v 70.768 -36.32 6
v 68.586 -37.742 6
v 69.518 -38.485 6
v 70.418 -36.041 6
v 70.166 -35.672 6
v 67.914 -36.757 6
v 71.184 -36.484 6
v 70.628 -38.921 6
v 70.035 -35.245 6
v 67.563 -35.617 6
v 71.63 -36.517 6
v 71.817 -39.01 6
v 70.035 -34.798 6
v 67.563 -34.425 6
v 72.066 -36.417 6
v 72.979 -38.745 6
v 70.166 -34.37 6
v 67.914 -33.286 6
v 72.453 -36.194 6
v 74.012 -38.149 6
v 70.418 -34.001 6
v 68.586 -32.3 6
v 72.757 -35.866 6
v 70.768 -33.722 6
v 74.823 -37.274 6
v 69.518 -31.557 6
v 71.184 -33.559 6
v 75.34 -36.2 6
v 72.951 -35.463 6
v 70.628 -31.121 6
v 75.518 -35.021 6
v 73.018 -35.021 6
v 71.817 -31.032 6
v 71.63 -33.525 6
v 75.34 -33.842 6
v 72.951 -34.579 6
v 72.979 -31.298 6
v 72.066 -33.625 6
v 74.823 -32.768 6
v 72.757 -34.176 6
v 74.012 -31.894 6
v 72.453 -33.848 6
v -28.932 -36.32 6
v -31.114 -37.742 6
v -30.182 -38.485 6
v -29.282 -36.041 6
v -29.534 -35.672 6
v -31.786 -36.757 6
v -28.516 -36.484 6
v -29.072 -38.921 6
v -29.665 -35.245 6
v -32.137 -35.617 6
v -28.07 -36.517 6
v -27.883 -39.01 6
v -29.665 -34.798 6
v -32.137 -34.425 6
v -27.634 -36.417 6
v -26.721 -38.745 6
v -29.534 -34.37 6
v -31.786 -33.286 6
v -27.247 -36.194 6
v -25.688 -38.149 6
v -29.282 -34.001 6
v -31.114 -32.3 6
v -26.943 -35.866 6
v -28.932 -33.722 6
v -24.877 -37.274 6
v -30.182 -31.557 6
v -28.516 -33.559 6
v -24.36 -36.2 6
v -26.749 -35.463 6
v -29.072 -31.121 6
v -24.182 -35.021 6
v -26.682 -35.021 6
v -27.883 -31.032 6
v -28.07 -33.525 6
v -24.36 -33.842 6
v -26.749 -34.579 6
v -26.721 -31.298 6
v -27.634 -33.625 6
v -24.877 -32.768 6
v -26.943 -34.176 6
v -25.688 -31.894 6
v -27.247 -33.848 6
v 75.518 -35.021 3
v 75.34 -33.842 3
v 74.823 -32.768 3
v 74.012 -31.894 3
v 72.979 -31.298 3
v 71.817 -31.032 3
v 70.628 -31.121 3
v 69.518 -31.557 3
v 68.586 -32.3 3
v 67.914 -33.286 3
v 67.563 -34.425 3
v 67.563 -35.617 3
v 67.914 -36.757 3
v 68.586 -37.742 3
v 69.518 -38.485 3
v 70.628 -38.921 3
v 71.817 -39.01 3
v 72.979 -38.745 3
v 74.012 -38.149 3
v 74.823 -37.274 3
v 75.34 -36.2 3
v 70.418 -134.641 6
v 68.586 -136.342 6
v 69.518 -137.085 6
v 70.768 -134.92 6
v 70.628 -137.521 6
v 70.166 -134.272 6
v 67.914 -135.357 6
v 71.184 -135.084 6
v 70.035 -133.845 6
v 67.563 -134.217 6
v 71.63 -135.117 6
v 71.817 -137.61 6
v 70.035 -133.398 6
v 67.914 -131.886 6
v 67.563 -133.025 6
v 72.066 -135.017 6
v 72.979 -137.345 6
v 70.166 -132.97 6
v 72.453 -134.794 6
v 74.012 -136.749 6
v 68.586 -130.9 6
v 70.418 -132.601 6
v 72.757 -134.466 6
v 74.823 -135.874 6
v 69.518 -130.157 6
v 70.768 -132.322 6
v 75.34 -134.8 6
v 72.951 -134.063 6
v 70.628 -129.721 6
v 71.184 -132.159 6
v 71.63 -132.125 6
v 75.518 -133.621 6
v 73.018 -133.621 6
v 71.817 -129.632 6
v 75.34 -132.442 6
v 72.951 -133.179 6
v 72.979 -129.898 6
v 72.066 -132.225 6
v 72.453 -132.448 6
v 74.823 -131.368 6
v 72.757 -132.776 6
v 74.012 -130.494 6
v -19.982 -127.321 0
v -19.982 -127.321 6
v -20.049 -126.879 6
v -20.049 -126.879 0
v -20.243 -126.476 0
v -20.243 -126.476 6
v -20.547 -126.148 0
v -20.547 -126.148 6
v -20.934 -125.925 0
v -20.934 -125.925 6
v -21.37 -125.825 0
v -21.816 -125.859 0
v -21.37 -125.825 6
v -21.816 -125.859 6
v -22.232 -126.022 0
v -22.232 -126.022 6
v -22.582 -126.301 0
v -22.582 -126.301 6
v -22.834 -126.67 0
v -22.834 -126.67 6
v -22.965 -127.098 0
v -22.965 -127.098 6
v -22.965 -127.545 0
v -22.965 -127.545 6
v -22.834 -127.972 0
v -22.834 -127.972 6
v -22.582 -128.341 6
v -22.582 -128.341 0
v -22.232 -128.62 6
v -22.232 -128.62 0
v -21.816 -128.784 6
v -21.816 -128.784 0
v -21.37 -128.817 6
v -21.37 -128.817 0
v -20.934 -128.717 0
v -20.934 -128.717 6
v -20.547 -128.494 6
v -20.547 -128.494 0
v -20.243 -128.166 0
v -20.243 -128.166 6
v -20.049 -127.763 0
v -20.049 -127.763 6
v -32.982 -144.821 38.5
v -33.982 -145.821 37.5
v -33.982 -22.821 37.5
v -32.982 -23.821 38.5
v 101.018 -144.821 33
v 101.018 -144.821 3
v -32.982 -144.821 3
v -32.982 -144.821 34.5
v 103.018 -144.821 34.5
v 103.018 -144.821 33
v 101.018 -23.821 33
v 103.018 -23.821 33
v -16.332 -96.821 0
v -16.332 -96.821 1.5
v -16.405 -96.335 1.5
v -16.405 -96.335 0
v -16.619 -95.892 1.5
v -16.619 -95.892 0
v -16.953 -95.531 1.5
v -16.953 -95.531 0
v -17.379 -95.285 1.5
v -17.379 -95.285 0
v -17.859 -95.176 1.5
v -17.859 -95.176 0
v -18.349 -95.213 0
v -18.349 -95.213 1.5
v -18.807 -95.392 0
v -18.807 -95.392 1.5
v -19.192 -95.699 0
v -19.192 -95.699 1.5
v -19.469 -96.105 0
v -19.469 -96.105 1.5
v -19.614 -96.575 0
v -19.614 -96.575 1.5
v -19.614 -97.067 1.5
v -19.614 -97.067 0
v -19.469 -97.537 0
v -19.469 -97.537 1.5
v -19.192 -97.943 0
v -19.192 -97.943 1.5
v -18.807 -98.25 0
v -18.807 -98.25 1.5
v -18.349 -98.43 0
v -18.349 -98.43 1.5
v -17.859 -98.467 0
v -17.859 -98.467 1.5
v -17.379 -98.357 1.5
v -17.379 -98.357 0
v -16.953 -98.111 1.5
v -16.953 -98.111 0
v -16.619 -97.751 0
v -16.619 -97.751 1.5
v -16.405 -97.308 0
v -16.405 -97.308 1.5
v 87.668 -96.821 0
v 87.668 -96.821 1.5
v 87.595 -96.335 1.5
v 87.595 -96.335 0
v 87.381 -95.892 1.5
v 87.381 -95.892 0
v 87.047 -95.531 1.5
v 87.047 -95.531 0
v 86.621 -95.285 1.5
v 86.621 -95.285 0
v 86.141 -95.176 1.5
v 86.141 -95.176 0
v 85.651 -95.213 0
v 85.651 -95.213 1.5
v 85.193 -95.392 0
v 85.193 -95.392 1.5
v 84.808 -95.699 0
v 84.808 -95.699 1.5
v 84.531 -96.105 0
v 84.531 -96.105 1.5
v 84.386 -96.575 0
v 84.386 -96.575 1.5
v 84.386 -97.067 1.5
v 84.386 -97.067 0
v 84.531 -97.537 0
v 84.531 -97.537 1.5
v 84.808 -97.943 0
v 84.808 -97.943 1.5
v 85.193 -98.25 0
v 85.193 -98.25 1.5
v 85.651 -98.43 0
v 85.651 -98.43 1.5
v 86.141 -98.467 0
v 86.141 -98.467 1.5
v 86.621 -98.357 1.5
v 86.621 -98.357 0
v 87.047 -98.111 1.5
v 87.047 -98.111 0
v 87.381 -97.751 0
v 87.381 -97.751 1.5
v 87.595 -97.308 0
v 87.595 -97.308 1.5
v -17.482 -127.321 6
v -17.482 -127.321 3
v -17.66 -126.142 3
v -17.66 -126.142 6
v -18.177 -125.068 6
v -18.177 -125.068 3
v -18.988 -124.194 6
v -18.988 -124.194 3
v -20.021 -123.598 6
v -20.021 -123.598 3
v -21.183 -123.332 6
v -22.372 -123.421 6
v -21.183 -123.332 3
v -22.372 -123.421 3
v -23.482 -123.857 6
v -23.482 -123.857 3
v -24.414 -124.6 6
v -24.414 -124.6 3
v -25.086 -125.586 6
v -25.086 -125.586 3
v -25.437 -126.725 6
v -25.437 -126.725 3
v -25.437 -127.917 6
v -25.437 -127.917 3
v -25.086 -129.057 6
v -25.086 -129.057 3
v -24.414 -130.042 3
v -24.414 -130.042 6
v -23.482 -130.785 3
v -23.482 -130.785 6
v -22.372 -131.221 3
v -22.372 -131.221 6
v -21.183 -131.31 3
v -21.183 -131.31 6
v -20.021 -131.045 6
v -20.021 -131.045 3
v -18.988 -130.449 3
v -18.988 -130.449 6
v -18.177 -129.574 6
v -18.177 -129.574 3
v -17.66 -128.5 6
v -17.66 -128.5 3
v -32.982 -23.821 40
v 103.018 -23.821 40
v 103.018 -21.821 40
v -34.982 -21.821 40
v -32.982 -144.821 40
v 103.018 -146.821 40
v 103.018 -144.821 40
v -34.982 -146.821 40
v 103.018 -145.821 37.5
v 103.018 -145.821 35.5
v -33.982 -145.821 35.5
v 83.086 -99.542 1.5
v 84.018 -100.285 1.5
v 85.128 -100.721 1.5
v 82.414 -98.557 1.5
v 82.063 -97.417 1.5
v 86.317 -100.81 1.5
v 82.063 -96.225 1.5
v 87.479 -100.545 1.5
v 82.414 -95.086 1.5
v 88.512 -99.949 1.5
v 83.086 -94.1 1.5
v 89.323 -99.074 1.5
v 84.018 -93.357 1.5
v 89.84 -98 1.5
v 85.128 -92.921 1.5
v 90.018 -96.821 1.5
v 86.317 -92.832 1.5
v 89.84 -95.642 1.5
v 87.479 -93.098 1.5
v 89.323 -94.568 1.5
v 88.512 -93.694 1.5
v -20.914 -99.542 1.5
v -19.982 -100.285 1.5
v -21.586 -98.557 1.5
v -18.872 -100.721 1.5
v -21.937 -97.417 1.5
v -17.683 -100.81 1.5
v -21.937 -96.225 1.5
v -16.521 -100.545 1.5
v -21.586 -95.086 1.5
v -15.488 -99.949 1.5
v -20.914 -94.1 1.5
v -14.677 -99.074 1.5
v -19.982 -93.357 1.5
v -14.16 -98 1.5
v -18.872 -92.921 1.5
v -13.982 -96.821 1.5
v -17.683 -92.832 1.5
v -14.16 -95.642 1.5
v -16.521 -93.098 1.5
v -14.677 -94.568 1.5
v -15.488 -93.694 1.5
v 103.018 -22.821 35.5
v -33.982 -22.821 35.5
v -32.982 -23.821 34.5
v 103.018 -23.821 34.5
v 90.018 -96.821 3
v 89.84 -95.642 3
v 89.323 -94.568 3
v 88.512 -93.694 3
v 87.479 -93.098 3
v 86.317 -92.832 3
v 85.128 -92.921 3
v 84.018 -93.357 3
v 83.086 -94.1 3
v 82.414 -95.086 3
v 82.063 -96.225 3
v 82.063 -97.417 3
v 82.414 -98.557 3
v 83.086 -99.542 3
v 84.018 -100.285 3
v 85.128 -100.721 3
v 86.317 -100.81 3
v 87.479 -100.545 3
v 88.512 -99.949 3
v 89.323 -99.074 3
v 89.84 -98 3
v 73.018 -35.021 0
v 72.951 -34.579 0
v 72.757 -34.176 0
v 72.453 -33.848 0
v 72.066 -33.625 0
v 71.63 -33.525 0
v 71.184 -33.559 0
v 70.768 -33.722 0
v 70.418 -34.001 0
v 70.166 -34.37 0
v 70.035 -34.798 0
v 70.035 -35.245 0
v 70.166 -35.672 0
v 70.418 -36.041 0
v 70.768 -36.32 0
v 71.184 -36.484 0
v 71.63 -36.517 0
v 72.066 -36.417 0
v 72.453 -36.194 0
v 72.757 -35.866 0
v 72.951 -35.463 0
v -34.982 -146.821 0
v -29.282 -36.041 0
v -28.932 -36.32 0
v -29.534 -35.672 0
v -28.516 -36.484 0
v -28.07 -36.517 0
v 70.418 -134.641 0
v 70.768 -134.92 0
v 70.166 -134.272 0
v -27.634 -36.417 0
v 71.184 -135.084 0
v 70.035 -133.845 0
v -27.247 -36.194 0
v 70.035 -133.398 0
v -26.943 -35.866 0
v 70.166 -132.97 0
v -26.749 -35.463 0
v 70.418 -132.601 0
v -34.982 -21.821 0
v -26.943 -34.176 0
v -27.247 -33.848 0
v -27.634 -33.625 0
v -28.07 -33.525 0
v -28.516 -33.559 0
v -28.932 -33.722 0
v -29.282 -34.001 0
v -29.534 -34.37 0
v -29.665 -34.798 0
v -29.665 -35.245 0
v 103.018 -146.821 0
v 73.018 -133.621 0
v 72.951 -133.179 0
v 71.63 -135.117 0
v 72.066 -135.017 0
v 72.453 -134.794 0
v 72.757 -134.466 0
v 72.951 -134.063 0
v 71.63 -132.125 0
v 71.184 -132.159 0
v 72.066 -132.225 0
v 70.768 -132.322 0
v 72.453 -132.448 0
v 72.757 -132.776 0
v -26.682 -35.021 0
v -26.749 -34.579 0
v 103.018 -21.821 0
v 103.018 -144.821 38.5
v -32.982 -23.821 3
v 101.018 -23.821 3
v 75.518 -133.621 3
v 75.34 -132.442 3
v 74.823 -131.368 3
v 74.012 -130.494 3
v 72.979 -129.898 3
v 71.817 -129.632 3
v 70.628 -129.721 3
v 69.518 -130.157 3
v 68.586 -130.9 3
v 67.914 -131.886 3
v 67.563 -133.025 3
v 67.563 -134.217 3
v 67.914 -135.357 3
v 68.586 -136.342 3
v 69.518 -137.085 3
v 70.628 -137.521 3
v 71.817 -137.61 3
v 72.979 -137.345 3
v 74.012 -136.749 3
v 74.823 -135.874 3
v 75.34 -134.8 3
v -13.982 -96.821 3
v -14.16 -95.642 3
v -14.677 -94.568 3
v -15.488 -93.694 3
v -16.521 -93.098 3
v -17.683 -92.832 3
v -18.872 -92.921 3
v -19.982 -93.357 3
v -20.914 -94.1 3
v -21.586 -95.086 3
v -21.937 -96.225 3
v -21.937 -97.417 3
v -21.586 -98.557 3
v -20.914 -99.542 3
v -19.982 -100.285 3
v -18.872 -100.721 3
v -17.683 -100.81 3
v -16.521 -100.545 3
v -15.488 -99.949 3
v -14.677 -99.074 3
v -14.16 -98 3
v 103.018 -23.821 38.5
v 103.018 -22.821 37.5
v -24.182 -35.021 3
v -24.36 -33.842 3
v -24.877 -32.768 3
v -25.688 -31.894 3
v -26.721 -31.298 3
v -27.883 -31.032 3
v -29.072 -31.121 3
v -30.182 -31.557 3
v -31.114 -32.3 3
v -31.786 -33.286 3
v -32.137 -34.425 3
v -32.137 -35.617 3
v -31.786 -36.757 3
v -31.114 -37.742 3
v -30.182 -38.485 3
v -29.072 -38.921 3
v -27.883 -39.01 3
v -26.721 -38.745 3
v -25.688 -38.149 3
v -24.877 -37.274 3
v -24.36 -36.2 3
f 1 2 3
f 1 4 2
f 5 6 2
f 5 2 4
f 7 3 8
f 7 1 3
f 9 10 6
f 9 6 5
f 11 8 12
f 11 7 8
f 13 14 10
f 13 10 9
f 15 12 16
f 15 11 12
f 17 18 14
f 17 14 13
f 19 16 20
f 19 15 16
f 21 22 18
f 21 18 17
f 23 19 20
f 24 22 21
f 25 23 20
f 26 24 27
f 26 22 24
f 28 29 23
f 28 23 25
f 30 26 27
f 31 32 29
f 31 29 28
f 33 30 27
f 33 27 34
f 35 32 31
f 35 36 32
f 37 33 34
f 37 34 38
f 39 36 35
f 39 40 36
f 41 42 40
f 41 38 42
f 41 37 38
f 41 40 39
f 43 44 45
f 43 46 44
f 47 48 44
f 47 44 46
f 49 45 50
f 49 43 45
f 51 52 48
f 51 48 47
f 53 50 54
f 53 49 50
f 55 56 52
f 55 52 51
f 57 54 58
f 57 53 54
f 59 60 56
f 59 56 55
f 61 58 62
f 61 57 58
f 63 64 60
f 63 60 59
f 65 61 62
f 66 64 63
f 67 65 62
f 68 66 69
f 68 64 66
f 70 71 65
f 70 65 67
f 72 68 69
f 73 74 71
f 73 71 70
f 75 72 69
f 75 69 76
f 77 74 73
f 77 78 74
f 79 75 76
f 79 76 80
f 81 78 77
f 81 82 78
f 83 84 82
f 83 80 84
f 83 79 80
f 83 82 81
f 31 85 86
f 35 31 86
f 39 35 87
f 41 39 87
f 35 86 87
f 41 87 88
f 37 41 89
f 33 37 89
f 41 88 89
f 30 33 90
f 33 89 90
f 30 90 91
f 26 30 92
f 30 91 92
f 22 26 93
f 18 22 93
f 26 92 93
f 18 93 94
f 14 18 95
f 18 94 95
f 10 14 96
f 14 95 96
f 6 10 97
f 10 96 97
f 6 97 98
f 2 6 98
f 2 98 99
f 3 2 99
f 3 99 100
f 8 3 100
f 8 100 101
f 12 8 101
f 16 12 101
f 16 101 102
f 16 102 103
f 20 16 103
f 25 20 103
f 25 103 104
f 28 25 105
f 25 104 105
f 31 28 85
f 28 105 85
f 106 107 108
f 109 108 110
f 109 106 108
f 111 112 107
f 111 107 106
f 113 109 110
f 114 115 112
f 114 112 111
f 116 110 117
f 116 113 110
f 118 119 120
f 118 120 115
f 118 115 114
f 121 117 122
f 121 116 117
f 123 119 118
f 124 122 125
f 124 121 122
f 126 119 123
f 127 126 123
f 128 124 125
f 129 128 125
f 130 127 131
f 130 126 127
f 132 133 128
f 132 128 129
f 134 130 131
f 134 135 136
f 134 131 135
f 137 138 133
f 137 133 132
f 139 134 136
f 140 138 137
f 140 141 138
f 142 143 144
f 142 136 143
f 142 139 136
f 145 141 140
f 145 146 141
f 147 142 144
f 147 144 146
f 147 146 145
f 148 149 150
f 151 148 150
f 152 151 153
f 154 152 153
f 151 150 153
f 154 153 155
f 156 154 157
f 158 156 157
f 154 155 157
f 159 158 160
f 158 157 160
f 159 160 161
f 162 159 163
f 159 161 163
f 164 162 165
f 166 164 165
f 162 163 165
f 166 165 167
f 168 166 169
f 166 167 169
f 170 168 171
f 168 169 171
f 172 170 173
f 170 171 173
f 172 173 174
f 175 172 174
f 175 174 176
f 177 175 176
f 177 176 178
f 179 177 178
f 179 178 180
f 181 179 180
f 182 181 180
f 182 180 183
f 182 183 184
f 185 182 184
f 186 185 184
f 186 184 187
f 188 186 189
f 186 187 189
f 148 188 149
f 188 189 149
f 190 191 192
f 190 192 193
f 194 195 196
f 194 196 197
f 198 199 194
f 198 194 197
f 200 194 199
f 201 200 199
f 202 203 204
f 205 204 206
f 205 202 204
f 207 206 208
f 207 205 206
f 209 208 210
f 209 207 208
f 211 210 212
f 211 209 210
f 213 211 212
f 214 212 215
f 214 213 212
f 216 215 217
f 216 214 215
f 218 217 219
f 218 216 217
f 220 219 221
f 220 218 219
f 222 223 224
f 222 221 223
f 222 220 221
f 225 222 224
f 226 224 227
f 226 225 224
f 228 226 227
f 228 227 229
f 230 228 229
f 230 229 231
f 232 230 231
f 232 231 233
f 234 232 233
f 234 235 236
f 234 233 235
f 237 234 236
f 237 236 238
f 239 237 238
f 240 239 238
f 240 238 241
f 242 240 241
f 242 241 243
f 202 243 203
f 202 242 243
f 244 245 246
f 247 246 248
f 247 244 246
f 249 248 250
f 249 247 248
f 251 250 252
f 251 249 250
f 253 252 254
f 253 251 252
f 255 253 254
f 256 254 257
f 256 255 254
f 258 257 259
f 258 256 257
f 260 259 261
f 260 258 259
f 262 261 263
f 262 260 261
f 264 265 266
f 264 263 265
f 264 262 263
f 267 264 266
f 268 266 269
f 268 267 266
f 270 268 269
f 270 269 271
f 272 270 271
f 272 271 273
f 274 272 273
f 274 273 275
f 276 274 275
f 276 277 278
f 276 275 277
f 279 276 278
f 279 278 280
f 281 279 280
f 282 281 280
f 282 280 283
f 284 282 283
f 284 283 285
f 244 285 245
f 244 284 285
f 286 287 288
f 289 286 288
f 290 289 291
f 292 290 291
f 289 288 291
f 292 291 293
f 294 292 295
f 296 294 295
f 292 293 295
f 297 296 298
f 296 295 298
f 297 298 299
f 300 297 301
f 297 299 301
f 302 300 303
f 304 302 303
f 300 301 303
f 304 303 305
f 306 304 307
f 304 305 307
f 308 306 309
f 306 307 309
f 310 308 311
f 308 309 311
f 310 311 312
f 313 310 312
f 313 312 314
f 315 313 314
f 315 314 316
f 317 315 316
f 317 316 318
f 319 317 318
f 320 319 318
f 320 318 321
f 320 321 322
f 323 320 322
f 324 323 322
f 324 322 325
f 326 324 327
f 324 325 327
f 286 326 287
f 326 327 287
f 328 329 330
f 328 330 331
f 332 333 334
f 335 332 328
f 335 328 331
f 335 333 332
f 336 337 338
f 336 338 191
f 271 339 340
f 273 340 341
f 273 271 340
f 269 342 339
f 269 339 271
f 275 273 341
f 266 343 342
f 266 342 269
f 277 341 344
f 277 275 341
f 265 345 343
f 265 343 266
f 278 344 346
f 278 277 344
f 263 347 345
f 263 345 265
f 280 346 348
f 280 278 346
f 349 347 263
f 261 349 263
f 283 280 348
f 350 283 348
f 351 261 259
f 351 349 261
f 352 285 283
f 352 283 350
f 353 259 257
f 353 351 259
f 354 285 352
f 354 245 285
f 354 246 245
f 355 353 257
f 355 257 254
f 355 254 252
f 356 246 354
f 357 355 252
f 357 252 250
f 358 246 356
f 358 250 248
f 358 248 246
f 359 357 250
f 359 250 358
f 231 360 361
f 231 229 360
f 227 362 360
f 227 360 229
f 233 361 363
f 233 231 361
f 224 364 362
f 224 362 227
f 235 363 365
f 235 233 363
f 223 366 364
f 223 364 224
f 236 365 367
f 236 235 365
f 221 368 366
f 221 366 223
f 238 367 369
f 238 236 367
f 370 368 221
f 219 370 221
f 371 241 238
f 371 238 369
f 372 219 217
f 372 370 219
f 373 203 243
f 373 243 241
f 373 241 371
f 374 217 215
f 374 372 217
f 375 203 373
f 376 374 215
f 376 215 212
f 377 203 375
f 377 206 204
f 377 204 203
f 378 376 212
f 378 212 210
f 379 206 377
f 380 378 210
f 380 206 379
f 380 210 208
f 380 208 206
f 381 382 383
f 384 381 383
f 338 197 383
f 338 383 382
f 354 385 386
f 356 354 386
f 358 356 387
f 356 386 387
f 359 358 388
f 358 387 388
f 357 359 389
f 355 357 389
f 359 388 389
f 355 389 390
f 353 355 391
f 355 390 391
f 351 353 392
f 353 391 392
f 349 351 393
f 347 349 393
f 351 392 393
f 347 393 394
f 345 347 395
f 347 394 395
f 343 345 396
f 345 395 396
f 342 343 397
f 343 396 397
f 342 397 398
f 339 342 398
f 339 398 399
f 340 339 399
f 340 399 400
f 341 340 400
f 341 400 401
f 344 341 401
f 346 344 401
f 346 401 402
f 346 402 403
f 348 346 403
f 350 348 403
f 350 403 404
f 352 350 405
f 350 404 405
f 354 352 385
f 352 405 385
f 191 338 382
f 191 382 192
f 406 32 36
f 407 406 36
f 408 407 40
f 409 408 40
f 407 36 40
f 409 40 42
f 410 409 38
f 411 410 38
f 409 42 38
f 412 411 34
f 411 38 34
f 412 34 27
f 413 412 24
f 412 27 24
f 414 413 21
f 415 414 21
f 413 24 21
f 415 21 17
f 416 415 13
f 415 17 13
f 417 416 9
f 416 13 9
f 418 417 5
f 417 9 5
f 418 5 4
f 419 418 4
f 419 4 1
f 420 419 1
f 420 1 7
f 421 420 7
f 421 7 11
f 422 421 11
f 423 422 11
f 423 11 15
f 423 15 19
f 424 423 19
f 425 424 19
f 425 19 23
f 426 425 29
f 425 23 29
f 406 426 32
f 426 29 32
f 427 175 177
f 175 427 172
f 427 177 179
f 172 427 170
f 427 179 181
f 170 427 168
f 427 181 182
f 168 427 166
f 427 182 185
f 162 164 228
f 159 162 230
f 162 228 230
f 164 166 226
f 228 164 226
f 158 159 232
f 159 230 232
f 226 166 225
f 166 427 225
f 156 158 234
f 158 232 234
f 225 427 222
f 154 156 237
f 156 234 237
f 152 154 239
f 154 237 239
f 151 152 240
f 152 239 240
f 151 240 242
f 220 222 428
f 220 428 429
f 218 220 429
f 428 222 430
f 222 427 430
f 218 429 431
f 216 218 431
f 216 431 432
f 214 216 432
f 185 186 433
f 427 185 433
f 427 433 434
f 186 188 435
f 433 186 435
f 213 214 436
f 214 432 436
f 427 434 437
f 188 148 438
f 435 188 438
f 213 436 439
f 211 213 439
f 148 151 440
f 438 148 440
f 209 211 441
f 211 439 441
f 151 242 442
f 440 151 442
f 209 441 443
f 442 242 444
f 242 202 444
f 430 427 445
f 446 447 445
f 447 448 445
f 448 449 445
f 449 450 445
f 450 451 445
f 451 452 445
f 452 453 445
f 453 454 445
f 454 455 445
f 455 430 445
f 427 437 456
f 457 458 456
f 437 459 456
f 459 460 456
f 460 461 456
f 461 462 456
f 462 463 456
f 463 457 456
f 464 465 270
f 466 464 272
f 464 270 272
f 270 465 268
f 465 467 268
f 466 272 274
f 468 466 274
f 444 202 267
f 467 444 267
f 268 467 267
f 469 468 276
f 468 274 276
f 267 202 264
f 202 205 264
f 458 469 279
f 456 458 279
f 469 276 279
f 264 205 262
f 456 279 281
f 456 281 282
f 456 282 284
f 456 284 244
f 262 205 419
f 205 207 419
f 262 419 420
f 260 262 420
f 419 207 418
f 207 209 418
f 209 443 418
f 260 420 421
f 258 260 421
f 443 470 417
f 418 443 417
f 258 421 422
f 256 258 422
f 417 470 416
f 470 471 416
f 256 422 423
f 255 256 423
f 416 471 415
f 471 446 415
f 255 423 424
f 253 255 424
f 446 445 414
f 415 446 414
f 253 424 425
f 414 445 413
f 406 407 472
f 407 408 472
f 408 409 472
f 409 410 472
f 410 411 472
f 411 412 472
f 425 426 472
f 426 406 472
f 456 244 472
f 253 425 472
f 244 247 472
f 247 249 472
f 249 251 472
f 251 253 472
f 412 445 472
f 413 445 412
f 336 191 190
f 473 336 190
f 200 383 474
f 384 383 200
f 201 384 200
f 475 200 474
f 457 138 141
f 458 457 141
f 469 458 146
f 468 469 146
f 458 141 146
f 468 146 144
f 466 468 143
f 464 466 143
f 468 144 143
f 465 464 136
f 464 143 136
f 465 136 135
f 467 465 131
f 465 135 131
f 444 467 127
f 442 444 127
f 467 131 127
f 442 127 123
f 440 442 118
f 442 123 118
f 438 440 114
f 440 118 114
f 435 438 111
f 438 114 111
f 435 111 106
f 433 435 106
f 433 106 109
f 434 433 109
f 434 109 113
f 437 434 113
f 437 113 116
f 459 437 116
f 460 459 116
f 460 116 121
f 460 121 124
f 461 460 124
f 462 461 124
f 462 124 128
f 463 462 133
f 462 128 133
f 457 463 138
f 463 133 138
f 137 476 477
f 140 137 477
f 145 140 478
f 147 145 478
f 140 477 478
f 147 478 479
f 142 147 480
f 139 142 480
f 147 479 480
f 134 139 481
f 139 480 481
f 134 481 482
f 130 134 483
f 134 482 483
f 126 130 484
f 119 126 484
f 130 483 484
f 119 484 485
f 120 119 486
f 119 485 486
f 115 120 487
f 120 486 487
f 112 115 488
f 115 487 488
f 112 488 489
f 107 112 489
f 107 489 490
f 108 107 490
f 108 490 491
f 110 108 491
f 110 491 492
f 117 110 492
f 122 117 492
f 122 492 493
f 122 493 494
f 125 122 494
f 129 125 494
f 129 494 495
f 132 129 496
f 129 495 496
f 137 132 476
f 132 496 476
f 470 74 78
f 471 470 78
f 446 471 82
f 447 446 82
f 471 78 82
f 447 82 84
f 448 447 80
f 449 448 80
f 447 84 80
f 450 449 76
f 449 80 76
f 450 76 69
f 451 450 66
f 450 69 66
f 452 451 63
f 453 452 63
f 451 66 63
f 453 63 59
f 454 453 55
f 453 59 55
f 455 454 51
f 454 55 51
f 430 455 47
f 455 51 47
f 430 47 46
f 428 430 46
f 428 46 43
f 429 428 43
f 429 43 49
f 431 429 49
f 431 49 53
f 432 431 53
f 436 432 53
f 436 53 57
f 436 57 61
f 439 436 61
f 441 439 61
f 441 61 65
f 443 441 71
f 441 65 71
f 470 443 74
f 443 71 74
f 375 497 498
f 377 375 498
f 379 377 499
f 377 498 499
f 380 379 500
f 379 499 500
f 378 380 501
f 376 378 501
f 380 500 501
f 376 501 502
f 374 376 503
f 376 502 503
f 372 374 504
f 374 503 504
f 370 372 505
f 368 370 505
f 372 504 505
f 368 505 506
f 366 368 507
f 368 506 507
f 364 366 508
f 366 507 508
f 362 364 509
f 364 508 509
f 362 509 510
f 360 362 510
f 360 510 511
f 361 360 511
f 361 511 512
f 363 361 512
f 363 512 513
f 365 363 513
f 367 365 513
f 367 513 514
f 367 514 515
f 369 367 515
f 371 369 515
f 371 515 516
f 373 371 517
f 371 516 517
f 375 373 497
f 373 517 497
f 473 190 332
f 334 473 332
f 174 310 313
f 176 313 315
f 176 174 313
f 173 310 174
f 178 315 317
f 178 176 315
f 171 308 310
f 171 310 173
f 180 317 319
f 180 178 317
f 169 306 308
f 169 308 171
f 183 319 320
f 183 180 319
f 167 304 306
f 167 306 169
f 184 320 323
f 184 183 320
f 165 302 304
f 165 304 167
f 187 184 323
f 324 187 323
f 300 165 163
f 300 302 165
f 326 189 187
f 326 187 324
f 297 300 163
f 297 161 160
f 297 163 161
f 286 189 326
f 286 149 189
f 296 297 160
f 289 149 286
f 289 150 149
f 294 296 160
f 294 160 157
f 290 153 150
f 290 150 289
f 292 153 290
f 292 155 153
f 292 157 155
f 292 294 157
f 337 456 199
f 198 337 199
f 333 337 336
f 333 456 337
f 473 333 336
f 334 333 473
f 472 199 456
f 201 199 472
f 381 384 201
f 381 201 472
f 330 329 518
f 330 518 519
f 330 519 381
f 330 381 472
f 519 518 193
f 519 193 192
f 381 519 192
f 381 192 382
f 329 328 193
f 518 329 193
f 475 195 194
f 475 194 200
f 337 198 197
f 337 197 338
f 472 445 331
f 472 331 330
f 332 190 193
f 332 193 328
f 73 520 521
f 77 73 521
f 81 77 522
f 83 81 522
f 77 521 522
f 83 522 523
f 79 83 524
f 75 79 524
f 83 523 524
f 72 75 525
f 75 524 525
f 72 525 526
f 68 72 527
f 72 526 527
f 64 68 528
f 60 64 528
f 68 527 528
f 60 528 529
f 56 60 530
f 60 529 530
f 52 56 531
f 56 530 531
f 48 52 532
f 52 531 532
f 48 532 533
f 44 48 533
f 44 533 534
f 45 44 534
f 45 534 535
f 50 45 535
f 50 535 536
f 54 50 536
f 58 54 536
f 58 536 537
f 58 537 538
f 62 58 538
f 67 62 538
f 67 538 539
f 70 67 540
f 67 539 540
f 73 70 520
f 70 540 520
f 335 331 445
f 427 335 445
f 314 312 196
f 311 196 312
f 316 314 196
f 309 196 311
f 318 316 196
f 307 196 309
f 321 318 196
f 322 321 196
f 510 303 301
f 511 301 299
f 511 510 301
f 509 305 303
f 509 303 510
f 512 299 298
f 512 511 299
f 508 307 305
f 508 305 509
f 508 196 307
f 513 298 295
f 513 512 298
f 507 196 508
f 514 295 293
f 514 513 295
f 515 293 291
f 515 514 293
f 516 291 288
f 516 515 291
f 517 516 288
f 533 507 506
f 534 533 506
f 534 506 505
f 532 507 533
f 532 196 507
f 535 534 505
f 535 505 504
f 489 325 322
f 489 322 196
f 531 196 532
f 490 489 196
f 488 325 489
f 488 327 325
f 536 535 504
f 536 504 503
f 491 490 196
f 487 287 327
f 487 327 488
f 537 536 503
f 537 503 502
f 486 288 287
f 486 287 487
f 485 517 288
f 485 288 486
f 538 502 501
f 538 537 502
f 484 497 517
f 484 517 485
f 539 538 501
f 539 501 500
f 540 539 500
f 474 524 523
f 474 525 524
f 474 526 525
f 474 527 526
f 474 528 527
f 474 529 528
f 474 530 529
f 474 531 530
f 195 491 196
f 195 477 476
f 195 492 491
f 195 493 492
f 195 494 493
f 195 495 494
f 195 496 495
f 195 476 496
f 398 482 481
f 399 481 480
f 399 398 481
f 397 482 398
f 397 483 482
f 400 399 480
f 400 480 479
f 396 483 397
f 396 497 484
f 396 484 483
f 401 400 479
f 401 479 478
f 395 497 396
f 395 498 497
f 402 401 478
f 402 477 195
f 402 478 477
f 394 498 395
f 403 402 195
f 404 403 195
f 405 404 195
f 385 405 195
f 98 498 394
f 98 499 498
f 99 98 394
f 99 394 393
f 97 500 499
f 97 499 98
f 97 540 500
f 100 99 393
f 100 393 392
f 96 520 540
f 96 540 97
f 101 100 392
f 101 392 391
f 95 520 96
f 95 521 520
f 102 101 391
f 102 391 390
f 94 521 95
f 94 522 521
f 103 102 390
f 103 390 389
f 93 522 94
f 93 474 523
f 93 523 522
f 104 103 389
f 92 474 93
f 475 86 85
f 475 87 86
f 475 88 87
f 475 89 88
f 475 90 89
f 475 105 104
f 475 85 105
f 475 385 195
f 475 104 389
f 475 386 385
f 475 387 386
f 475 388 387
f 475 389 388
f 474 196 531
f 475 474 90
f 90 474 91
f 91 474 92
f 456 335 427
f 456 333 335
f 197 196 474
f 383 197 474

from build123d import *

# Parameters (mm, degrees)
F0_W      = 138
F0_H      = 125
F0_R      = 1.65
F1_DEPTH  = 3
F2_R      = 4
F3_DEPTH  = 1.5
F4_R      = 4
F5_DEPTH  = 3
F6_R      = 1.5
F7_DEPTH  = 6
F8_W      = 138
F8_H      = 125
F8_W_2    = 134
F8_H_2    = 121
F9_DEPTH  = 30
F11_DEPTH = 138
F13_DEPTH = 125


with BuildPart() as f1:
    # F0 (on Top) → F1 (new body)
    with BuildSketch(Plane.XY):
        with Locations((34.017931, -84.321183)):
            Rectangle(F0_W, F0_H)
        with Locations((-17.982069, -96.821183)):
            Circle(F0_R, mode=Mode.SUBTRACT)
        with Locations((86.017931, -96.821183)):
            Circle(F0_R, mode=Mode.SUBTRACT)
    extrude(amount=F1_DEPTH)

    # F2 (on face) → F3 (cut)
    with BuildSketch(Plane.XY.offset(3)):
        with Locations((-17.982069, -96.821183)):
            Circle(F2_R)
        with Locations((86.017931, -96.821183)):
            Circle(F2_R)
    extrude(amount=-F3_DEPTH, mode=Mode.SUBTRACT)

    # F4 (on face) → F5 (join)
    with BuildSketch(Plane.XY.offset(3)):
        with Locations((-21.482069, -127.321183)):
            Circle(F4_R)
        with Locations((-28.182069, -35.021183)):
            Circle(F4_R)
        with Locations((71.517931, -35.021183)):
            Circle(F4_R)
        with Locations((71.517931, -133.621183)):
            Circle(F4_R)
    extrude(amount=F5_DEPTH)

    # F6 (on face) → F7 (cut)
    with BuildSketch(Plane.XY.offset(6)):
        with Locations((-28.182069, -35.021183)):
            Circle(F6_R)
        with Locations((71.517931, -35.021183)):
            Circle(F6_R)
        with Locations((71.517931, -133.621183)):
            Circle(F6_R)
        with Locations((-21.482069, -127.321183)):
            Circle(F6_R)
    extrude(amount=-F7_DEPTH, mode=Mode.SUBTRACT)

    # F8 (on face) → F9 (join)
    with BuildSketch(Plane.XY.offset(3)):
        with Locations((34.017931, -84.321183)):
            Rectangle(F8_W, F8_H)
        with Locations((34.017931, -84.321183)):
            Rectangle(F8_W_2, F8_H_2, mode=Mode.SUBTRACT)
    extrude(amount=F9_DEPTH)

    # F10 (on face) → F11 (join)
    with BuildSketch(Plane.YZ.offset(103.017931)):
        Polygon((-146.821183, 40), (-146.821183, 33), (-144.821183, 33), (-144.821183, 34.5), (-145.821183, 35.5), (-145.821183, 37.5), (-144.821183, 38.5), (-144.821183, 40), align=None)
        Polygon((-23.821183, 40), (-23.821183, 38.5), (-22.821183, 37.5), (-22.821183, 35.5), (-23.821183, 34.5), (-23.821183, 33), (-21.821183, 33), (-21.821183, 40), align=None)
    extrude(amount=-F11_DEPTH)

    # F12 (on face) → F13 (join)
    with BuildSketch(Plane.XZ.offset(146.821183)):
        Polygon((-34.982069, 40), (-34.982069, 33), (-32.982069, 33), (-32.982069, 34.5), (-33.982069, 35.5), (-33.982069, 37.5), (-32.982069, 38.5), (-32.982069, 40), align=None)
    extrude(amount=-F13_DEPTH)


solid = f1.part
